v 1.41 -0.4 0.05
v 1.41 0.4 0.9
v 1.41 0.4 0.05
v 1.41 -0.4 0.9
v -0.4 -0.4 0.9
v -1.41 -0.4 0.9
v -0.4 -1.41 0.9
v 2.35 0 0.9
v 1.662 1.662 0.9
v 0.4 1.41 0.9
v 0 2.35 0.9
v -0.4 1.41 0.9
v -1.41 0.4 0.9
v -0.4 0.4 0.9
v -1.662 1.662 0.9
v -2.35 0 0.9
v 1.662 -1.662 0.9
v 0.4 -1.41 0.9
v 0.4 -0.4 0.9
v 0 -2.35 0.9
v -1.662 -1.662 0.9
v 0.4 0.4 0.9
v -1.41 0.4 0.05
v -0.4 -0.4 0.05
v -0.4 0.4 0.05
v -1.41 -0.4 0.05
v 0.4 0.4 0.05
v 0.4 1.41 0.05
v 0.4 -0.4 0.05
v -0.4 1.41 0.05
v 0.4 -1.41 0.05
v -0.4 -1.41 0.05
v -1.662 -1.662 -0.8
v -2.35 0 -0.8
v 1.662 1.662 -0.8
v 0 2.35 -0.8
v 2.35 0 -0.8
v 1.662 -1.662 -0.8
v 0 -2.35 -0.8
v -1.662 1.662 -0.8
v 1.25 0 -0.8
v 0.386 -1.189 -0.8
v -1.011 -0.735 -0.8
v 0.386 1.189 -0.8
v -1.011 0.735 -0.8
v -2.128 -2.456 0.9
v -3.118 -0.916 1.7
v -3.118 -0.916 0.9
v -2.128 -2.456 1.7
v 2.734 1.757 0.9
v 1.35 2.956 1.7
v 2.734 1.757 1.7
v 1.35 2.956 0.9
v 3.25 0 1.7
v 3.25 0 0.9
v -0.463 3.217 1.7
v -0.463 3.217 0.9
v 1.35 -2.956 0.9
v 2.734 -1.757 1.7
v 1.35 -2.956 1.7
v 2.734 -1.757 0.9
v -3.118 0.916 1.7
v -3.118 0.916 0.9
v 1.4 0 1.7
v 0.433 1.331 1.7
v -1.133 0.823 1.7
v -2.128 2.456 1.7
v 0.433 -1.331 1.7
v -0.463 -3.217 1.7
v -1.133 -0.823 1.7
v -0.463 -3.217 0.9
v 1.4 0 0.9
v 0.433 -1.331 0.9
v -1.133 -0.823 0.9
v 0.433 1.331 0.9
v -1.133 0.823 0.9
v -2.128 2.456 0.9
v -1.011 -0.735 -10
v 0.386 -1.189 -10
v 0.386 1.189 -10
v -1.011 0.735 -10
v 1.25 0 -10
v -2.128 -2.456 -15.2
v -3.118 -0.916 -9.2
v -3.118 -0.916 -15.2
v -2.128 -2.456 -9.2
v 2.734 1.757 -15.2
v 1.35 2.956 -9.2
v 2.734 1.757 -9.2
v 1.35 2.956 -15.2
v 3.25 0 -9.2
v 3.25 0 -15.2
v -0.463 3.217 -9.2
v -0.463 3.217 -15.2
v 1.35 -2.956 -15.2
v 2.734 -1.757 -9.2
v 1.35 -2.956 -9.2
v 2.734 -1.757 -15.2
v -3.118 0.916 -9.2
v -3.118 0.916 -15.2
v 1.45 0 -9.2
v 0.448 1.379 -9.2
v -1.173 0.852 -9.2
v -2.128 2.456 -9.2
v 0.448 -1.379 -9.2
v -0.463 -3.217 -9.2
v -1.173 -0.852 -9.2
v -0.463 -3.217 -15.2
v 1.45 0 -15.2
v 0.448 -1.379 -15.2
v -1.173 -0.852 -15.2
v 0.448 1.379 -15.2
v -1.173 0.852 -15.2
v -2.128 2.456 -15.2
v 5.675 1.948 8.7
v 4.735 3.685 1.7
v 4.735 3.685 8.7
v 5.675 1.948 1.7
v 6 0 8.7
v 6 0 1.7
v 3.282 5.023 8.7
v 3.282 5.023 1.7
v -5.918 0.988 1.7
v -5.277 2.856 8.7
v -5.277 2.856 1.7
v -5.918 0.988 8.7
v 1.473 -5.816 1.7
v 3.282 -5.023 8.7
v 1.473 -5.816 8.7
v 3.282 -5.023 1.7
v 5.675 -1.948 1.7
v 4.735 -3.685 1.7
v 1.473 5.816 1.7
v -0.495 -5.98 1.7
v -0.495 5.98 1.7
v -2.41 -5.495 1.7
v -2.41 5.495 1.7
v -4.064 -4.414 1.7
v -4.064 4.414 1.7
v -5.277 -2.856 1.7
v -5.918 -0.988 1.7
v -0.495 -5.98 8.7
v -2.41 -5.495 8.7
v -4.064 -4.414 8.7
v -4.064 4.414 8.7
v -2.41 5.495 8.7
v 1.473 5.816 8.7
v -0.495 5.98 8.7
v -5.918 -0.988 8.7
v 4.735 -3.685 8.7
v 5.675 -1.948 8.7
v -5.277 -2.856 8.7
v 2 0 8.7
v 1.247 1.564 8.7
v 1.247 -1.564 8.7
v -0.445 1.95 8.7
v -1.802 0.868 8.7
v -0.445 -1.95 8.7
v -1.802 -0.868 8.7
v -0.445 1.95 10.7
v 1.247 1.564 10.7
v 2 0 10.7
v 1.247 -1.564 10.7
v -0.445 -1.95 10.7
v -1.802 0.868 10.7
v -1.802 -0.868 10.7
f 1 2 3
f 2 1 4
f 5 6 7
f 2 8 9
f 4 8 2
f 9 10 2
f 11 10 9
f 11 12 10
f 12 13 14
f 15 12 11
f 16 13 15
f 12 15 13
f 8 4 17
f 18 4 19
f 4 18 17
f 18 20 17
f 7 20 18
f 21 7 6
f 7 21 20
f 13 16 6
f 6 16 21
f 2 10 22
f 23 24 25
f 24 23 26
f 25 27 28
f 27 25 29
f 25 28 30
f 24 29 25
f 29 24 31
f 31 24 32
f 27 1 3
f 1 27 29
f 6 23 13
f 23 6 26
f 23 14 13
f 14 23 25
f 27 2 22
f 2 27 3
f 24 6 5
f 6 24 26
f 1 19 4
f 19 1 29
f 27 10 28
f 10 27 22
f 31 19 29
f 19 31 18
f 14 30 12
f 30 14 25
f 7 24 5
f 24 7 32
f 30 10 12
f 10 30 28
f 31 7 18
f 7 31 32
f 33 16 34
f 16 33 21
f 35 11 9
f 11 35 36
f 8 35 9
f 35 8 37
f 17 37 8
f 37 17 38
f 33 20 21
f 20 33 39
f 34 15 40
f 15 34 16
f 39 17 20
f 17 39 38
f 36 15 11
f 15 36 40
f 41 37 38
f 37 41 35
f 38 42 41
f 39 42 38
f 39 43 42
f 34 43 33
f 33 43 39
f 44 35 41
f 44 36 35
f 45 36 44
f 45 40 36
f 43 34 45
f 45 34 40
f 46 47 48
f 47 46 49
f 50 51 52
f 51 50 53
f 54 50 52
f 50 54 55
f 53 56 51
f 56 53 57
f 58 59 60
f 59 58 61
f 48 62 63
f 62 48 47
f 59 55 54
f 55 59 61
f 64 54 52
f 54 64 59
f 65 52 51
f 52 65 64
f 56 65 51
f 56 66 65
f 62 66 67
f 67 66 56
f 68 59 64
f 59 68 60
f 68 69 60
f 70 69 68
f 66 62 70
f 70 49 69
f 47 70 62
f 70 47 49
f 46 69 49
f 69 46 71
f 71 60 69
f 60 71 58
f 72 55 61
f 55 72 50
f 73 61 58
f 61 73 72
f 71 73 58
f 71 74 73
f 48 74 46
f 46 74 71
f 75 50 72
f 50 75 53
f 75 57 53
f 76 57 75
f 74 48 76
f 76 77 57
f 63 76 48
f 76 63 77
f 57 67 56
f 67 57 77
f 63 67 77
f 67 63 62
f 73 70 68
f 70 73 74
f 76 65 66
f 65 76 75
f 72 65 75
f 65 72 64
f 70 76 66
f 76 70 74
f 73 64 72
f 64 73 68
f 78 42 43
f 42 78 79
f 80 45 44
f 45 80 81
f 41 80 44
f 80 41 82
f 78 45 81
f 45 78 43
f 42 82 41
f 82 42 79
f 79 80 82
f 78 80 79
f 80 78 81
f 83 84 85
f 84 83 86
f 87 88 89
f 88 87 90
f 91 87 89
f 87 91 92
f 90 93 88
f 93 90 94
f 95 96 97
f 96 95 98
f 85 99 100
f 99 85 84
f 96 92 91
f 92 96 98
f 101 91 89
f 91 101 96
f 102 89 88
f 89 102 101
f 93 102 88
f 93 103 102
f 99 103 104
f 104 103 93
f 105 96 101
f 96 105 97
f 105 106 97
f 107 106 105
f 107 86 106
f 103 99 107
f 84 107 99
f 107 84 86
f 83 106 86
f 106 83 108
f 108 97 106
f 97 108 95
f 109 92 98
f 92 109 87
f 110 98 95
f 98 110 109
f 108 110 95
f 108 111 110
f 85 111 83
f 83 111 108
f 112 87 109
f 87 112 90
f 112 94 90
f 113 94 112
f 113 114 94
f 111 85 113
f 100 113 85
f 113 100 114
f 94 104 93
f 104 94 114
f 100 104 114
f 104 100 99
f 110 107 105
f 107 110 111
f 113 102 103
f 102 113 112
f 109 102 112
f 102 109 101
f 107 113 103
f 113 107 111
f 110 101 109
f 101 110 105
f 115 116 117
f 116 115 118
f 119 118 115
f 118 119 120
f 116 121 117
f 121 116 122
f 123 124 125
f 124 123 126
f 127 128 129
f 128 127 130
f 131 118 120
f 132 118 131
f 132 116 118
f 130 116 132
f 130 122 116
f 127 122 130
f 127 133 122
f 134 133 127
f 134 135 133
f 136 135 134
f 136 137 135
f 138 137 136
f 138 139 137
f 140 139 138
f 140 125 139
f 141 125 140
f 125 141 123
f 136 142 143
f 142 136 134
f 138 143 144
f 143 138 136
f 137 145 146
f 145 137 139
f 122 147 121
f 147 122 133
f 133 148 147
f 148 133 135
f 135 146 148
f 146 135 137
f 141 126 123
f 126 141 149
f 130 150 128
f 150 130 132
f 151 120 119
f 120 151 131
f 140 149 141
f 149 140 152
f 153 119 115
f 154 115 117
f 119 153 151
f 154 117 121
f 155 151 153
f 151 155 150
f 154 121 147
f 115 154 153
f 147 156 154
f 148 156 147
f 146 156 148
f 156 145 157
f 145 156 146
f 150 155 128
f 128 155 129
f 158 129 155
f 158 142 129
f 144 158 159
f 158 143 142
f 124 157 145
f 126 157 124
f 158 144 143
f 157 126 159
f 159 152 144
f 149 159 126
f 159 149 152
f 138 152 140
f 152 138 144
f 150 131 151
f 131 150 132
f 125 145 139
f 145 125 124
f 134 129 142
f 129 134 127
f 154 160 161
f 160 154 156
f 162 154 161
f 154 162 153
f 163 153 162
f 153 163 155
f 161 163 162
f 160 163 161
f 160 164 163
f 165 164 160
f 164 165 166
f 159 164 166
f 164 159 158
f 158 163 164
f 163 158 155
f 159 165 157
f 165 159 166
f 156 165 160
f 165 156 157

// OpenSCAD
// Parameters
shank_diameter_mm = 2.5; //[1.25:5:0.05]
length_mm = 10; //[5:20:0.5]
head_diameter_mm = 4.7; //[2.35:9.4:0.05]
head_height_mm = 1.7; //[0.85:3.4:0.05]
recess_enabled = 1; //[0:1:1]
recess_radius_factor = 0.6; //[0.3:0.9:0.05]
recess_depth_factor = 0.5; //[0.2:0.9:0.05]
recess_slot_width_mm = 0.8; //[0.4:1.6:0.05]
overlap_mm = 0.8; //[0.2:2:0.1]
washer_outer_diameter_mm = 6.5; //[3.25:13:0.1]
washer_thickness_mm = 0.8; //[0.4:1.6:0.05]
washer_hole_diameter_mm = 2.8; //[1.6:4.5:0.05]
spacer_height_mm = 6; //[3:12:0.5]
spacer_wall_mm = 1.8; //[0.9:3.6:0.1]
spacer_clearance_diameter_mm = 2.9; //[2.6:3.6:0.05]
buzzer_diameter_mm = 12; //[6:24:0.5]
buzzer_height_mm = 7; //[3.5:14:0.5]
buzzer_nozzle_diameter_mm = 4; //[2:8:0.5]
buzzer_nozzle_height_mm = 2; //[1:4:0.25]

// PCB Spacer - complete geometry
module pcb_spacer() {
  color([0.85, 0.85, 0.8]) {
    difference() {
      cylinder(r=spacer_clearance_diameter_mm/2 + spacer_wall_mm, h=spacer_height_mm, center=true);
      translate([0, 0, -overlap_mm])
        cylinder(r=spacer_clearance_diameter_mm/2, h=spacer_height_mm + 2*overlap_mm, center=true);
    }
  }
}

// Screw and Washer - complete geometry
module screw_and_washer() {
  color("DimGray") {
    union() {
      // Screw Shank
      translate([0, 0, -length_mm/2])
        cylinder(r=shank_diameter_mm/2, h=length_mm, center=true);
      
      // Pan Head
      translate([0, 0, head_height_mm/2 - overlap_mm])
        difference() {
          cylinder(r=head_diameter_mm/2, h=head_height_mm, center=true);
          if (recess_enabled) {
            union() {
              translate([0, 0, head_height_mm/2 - (head_height_mm*recess_depth_factor)/2])
                cube([2*(head_diameter_mm/2)*recess_radius_factor, recess_slot_width_mm, head_height_mm*recess_depth_factor], center=true);
              translate([0, 0, head_height_mm/2 - (head_height_mm*recess_depth_factor)/2])
                cube([recess_slot_width_mm, 2*(head_diameter_mm/2)*recess_radius_factor, head_height_mm*recess_depth_factor], center=true);
            }
          }
        }
      
      // Washer
      translate([0, 0, washer_thickness_mm/2 + head_height_mm - overlap_mm])
        difference() {
          cylinder(r=washer_outer_diameter_mm/2, h=washer_thickness_mm, center=true);
          translate([0, 0, -overlap_mm])
            cylinder(r=washer_hole_diameter_mm/2, h=washer_thickness_mm + 2*overlap_mm, center=true);
        }
    }
  }
}

// Buzzer - complete geometry
module buzzer() {
  color([0.1, 0.1, 0.6]) {
    union() {
      // Buzzer Body
      translate([0, 0, head_height_mm + washer_thickness_mm + buzzer_height_mm/2 - overlap_mm])
        cylinder(r=buzzer_diameter_mm/2, h=buzzer_height_mm, center=true);
      
      // Buzzer Nozzle
      translate([0, 0, head_height_mm + washer_thickness_mm + buzzer_height_mm - overlap_mm + buzzer_nozzle_height_mm/2])
        cylinder(r=buzzer_nozzle_diameter_mm/2, h=buzzer_nozzle_height_mm, center=true);
    }
  }
}

// Assembly
module assembly() {
  screw_and_washer();
  translate([0, 0, -length_mm - spacer_height_mm/2 + overlap_mm]) pcb_spacer();
  buzzer();
}

assembly();
